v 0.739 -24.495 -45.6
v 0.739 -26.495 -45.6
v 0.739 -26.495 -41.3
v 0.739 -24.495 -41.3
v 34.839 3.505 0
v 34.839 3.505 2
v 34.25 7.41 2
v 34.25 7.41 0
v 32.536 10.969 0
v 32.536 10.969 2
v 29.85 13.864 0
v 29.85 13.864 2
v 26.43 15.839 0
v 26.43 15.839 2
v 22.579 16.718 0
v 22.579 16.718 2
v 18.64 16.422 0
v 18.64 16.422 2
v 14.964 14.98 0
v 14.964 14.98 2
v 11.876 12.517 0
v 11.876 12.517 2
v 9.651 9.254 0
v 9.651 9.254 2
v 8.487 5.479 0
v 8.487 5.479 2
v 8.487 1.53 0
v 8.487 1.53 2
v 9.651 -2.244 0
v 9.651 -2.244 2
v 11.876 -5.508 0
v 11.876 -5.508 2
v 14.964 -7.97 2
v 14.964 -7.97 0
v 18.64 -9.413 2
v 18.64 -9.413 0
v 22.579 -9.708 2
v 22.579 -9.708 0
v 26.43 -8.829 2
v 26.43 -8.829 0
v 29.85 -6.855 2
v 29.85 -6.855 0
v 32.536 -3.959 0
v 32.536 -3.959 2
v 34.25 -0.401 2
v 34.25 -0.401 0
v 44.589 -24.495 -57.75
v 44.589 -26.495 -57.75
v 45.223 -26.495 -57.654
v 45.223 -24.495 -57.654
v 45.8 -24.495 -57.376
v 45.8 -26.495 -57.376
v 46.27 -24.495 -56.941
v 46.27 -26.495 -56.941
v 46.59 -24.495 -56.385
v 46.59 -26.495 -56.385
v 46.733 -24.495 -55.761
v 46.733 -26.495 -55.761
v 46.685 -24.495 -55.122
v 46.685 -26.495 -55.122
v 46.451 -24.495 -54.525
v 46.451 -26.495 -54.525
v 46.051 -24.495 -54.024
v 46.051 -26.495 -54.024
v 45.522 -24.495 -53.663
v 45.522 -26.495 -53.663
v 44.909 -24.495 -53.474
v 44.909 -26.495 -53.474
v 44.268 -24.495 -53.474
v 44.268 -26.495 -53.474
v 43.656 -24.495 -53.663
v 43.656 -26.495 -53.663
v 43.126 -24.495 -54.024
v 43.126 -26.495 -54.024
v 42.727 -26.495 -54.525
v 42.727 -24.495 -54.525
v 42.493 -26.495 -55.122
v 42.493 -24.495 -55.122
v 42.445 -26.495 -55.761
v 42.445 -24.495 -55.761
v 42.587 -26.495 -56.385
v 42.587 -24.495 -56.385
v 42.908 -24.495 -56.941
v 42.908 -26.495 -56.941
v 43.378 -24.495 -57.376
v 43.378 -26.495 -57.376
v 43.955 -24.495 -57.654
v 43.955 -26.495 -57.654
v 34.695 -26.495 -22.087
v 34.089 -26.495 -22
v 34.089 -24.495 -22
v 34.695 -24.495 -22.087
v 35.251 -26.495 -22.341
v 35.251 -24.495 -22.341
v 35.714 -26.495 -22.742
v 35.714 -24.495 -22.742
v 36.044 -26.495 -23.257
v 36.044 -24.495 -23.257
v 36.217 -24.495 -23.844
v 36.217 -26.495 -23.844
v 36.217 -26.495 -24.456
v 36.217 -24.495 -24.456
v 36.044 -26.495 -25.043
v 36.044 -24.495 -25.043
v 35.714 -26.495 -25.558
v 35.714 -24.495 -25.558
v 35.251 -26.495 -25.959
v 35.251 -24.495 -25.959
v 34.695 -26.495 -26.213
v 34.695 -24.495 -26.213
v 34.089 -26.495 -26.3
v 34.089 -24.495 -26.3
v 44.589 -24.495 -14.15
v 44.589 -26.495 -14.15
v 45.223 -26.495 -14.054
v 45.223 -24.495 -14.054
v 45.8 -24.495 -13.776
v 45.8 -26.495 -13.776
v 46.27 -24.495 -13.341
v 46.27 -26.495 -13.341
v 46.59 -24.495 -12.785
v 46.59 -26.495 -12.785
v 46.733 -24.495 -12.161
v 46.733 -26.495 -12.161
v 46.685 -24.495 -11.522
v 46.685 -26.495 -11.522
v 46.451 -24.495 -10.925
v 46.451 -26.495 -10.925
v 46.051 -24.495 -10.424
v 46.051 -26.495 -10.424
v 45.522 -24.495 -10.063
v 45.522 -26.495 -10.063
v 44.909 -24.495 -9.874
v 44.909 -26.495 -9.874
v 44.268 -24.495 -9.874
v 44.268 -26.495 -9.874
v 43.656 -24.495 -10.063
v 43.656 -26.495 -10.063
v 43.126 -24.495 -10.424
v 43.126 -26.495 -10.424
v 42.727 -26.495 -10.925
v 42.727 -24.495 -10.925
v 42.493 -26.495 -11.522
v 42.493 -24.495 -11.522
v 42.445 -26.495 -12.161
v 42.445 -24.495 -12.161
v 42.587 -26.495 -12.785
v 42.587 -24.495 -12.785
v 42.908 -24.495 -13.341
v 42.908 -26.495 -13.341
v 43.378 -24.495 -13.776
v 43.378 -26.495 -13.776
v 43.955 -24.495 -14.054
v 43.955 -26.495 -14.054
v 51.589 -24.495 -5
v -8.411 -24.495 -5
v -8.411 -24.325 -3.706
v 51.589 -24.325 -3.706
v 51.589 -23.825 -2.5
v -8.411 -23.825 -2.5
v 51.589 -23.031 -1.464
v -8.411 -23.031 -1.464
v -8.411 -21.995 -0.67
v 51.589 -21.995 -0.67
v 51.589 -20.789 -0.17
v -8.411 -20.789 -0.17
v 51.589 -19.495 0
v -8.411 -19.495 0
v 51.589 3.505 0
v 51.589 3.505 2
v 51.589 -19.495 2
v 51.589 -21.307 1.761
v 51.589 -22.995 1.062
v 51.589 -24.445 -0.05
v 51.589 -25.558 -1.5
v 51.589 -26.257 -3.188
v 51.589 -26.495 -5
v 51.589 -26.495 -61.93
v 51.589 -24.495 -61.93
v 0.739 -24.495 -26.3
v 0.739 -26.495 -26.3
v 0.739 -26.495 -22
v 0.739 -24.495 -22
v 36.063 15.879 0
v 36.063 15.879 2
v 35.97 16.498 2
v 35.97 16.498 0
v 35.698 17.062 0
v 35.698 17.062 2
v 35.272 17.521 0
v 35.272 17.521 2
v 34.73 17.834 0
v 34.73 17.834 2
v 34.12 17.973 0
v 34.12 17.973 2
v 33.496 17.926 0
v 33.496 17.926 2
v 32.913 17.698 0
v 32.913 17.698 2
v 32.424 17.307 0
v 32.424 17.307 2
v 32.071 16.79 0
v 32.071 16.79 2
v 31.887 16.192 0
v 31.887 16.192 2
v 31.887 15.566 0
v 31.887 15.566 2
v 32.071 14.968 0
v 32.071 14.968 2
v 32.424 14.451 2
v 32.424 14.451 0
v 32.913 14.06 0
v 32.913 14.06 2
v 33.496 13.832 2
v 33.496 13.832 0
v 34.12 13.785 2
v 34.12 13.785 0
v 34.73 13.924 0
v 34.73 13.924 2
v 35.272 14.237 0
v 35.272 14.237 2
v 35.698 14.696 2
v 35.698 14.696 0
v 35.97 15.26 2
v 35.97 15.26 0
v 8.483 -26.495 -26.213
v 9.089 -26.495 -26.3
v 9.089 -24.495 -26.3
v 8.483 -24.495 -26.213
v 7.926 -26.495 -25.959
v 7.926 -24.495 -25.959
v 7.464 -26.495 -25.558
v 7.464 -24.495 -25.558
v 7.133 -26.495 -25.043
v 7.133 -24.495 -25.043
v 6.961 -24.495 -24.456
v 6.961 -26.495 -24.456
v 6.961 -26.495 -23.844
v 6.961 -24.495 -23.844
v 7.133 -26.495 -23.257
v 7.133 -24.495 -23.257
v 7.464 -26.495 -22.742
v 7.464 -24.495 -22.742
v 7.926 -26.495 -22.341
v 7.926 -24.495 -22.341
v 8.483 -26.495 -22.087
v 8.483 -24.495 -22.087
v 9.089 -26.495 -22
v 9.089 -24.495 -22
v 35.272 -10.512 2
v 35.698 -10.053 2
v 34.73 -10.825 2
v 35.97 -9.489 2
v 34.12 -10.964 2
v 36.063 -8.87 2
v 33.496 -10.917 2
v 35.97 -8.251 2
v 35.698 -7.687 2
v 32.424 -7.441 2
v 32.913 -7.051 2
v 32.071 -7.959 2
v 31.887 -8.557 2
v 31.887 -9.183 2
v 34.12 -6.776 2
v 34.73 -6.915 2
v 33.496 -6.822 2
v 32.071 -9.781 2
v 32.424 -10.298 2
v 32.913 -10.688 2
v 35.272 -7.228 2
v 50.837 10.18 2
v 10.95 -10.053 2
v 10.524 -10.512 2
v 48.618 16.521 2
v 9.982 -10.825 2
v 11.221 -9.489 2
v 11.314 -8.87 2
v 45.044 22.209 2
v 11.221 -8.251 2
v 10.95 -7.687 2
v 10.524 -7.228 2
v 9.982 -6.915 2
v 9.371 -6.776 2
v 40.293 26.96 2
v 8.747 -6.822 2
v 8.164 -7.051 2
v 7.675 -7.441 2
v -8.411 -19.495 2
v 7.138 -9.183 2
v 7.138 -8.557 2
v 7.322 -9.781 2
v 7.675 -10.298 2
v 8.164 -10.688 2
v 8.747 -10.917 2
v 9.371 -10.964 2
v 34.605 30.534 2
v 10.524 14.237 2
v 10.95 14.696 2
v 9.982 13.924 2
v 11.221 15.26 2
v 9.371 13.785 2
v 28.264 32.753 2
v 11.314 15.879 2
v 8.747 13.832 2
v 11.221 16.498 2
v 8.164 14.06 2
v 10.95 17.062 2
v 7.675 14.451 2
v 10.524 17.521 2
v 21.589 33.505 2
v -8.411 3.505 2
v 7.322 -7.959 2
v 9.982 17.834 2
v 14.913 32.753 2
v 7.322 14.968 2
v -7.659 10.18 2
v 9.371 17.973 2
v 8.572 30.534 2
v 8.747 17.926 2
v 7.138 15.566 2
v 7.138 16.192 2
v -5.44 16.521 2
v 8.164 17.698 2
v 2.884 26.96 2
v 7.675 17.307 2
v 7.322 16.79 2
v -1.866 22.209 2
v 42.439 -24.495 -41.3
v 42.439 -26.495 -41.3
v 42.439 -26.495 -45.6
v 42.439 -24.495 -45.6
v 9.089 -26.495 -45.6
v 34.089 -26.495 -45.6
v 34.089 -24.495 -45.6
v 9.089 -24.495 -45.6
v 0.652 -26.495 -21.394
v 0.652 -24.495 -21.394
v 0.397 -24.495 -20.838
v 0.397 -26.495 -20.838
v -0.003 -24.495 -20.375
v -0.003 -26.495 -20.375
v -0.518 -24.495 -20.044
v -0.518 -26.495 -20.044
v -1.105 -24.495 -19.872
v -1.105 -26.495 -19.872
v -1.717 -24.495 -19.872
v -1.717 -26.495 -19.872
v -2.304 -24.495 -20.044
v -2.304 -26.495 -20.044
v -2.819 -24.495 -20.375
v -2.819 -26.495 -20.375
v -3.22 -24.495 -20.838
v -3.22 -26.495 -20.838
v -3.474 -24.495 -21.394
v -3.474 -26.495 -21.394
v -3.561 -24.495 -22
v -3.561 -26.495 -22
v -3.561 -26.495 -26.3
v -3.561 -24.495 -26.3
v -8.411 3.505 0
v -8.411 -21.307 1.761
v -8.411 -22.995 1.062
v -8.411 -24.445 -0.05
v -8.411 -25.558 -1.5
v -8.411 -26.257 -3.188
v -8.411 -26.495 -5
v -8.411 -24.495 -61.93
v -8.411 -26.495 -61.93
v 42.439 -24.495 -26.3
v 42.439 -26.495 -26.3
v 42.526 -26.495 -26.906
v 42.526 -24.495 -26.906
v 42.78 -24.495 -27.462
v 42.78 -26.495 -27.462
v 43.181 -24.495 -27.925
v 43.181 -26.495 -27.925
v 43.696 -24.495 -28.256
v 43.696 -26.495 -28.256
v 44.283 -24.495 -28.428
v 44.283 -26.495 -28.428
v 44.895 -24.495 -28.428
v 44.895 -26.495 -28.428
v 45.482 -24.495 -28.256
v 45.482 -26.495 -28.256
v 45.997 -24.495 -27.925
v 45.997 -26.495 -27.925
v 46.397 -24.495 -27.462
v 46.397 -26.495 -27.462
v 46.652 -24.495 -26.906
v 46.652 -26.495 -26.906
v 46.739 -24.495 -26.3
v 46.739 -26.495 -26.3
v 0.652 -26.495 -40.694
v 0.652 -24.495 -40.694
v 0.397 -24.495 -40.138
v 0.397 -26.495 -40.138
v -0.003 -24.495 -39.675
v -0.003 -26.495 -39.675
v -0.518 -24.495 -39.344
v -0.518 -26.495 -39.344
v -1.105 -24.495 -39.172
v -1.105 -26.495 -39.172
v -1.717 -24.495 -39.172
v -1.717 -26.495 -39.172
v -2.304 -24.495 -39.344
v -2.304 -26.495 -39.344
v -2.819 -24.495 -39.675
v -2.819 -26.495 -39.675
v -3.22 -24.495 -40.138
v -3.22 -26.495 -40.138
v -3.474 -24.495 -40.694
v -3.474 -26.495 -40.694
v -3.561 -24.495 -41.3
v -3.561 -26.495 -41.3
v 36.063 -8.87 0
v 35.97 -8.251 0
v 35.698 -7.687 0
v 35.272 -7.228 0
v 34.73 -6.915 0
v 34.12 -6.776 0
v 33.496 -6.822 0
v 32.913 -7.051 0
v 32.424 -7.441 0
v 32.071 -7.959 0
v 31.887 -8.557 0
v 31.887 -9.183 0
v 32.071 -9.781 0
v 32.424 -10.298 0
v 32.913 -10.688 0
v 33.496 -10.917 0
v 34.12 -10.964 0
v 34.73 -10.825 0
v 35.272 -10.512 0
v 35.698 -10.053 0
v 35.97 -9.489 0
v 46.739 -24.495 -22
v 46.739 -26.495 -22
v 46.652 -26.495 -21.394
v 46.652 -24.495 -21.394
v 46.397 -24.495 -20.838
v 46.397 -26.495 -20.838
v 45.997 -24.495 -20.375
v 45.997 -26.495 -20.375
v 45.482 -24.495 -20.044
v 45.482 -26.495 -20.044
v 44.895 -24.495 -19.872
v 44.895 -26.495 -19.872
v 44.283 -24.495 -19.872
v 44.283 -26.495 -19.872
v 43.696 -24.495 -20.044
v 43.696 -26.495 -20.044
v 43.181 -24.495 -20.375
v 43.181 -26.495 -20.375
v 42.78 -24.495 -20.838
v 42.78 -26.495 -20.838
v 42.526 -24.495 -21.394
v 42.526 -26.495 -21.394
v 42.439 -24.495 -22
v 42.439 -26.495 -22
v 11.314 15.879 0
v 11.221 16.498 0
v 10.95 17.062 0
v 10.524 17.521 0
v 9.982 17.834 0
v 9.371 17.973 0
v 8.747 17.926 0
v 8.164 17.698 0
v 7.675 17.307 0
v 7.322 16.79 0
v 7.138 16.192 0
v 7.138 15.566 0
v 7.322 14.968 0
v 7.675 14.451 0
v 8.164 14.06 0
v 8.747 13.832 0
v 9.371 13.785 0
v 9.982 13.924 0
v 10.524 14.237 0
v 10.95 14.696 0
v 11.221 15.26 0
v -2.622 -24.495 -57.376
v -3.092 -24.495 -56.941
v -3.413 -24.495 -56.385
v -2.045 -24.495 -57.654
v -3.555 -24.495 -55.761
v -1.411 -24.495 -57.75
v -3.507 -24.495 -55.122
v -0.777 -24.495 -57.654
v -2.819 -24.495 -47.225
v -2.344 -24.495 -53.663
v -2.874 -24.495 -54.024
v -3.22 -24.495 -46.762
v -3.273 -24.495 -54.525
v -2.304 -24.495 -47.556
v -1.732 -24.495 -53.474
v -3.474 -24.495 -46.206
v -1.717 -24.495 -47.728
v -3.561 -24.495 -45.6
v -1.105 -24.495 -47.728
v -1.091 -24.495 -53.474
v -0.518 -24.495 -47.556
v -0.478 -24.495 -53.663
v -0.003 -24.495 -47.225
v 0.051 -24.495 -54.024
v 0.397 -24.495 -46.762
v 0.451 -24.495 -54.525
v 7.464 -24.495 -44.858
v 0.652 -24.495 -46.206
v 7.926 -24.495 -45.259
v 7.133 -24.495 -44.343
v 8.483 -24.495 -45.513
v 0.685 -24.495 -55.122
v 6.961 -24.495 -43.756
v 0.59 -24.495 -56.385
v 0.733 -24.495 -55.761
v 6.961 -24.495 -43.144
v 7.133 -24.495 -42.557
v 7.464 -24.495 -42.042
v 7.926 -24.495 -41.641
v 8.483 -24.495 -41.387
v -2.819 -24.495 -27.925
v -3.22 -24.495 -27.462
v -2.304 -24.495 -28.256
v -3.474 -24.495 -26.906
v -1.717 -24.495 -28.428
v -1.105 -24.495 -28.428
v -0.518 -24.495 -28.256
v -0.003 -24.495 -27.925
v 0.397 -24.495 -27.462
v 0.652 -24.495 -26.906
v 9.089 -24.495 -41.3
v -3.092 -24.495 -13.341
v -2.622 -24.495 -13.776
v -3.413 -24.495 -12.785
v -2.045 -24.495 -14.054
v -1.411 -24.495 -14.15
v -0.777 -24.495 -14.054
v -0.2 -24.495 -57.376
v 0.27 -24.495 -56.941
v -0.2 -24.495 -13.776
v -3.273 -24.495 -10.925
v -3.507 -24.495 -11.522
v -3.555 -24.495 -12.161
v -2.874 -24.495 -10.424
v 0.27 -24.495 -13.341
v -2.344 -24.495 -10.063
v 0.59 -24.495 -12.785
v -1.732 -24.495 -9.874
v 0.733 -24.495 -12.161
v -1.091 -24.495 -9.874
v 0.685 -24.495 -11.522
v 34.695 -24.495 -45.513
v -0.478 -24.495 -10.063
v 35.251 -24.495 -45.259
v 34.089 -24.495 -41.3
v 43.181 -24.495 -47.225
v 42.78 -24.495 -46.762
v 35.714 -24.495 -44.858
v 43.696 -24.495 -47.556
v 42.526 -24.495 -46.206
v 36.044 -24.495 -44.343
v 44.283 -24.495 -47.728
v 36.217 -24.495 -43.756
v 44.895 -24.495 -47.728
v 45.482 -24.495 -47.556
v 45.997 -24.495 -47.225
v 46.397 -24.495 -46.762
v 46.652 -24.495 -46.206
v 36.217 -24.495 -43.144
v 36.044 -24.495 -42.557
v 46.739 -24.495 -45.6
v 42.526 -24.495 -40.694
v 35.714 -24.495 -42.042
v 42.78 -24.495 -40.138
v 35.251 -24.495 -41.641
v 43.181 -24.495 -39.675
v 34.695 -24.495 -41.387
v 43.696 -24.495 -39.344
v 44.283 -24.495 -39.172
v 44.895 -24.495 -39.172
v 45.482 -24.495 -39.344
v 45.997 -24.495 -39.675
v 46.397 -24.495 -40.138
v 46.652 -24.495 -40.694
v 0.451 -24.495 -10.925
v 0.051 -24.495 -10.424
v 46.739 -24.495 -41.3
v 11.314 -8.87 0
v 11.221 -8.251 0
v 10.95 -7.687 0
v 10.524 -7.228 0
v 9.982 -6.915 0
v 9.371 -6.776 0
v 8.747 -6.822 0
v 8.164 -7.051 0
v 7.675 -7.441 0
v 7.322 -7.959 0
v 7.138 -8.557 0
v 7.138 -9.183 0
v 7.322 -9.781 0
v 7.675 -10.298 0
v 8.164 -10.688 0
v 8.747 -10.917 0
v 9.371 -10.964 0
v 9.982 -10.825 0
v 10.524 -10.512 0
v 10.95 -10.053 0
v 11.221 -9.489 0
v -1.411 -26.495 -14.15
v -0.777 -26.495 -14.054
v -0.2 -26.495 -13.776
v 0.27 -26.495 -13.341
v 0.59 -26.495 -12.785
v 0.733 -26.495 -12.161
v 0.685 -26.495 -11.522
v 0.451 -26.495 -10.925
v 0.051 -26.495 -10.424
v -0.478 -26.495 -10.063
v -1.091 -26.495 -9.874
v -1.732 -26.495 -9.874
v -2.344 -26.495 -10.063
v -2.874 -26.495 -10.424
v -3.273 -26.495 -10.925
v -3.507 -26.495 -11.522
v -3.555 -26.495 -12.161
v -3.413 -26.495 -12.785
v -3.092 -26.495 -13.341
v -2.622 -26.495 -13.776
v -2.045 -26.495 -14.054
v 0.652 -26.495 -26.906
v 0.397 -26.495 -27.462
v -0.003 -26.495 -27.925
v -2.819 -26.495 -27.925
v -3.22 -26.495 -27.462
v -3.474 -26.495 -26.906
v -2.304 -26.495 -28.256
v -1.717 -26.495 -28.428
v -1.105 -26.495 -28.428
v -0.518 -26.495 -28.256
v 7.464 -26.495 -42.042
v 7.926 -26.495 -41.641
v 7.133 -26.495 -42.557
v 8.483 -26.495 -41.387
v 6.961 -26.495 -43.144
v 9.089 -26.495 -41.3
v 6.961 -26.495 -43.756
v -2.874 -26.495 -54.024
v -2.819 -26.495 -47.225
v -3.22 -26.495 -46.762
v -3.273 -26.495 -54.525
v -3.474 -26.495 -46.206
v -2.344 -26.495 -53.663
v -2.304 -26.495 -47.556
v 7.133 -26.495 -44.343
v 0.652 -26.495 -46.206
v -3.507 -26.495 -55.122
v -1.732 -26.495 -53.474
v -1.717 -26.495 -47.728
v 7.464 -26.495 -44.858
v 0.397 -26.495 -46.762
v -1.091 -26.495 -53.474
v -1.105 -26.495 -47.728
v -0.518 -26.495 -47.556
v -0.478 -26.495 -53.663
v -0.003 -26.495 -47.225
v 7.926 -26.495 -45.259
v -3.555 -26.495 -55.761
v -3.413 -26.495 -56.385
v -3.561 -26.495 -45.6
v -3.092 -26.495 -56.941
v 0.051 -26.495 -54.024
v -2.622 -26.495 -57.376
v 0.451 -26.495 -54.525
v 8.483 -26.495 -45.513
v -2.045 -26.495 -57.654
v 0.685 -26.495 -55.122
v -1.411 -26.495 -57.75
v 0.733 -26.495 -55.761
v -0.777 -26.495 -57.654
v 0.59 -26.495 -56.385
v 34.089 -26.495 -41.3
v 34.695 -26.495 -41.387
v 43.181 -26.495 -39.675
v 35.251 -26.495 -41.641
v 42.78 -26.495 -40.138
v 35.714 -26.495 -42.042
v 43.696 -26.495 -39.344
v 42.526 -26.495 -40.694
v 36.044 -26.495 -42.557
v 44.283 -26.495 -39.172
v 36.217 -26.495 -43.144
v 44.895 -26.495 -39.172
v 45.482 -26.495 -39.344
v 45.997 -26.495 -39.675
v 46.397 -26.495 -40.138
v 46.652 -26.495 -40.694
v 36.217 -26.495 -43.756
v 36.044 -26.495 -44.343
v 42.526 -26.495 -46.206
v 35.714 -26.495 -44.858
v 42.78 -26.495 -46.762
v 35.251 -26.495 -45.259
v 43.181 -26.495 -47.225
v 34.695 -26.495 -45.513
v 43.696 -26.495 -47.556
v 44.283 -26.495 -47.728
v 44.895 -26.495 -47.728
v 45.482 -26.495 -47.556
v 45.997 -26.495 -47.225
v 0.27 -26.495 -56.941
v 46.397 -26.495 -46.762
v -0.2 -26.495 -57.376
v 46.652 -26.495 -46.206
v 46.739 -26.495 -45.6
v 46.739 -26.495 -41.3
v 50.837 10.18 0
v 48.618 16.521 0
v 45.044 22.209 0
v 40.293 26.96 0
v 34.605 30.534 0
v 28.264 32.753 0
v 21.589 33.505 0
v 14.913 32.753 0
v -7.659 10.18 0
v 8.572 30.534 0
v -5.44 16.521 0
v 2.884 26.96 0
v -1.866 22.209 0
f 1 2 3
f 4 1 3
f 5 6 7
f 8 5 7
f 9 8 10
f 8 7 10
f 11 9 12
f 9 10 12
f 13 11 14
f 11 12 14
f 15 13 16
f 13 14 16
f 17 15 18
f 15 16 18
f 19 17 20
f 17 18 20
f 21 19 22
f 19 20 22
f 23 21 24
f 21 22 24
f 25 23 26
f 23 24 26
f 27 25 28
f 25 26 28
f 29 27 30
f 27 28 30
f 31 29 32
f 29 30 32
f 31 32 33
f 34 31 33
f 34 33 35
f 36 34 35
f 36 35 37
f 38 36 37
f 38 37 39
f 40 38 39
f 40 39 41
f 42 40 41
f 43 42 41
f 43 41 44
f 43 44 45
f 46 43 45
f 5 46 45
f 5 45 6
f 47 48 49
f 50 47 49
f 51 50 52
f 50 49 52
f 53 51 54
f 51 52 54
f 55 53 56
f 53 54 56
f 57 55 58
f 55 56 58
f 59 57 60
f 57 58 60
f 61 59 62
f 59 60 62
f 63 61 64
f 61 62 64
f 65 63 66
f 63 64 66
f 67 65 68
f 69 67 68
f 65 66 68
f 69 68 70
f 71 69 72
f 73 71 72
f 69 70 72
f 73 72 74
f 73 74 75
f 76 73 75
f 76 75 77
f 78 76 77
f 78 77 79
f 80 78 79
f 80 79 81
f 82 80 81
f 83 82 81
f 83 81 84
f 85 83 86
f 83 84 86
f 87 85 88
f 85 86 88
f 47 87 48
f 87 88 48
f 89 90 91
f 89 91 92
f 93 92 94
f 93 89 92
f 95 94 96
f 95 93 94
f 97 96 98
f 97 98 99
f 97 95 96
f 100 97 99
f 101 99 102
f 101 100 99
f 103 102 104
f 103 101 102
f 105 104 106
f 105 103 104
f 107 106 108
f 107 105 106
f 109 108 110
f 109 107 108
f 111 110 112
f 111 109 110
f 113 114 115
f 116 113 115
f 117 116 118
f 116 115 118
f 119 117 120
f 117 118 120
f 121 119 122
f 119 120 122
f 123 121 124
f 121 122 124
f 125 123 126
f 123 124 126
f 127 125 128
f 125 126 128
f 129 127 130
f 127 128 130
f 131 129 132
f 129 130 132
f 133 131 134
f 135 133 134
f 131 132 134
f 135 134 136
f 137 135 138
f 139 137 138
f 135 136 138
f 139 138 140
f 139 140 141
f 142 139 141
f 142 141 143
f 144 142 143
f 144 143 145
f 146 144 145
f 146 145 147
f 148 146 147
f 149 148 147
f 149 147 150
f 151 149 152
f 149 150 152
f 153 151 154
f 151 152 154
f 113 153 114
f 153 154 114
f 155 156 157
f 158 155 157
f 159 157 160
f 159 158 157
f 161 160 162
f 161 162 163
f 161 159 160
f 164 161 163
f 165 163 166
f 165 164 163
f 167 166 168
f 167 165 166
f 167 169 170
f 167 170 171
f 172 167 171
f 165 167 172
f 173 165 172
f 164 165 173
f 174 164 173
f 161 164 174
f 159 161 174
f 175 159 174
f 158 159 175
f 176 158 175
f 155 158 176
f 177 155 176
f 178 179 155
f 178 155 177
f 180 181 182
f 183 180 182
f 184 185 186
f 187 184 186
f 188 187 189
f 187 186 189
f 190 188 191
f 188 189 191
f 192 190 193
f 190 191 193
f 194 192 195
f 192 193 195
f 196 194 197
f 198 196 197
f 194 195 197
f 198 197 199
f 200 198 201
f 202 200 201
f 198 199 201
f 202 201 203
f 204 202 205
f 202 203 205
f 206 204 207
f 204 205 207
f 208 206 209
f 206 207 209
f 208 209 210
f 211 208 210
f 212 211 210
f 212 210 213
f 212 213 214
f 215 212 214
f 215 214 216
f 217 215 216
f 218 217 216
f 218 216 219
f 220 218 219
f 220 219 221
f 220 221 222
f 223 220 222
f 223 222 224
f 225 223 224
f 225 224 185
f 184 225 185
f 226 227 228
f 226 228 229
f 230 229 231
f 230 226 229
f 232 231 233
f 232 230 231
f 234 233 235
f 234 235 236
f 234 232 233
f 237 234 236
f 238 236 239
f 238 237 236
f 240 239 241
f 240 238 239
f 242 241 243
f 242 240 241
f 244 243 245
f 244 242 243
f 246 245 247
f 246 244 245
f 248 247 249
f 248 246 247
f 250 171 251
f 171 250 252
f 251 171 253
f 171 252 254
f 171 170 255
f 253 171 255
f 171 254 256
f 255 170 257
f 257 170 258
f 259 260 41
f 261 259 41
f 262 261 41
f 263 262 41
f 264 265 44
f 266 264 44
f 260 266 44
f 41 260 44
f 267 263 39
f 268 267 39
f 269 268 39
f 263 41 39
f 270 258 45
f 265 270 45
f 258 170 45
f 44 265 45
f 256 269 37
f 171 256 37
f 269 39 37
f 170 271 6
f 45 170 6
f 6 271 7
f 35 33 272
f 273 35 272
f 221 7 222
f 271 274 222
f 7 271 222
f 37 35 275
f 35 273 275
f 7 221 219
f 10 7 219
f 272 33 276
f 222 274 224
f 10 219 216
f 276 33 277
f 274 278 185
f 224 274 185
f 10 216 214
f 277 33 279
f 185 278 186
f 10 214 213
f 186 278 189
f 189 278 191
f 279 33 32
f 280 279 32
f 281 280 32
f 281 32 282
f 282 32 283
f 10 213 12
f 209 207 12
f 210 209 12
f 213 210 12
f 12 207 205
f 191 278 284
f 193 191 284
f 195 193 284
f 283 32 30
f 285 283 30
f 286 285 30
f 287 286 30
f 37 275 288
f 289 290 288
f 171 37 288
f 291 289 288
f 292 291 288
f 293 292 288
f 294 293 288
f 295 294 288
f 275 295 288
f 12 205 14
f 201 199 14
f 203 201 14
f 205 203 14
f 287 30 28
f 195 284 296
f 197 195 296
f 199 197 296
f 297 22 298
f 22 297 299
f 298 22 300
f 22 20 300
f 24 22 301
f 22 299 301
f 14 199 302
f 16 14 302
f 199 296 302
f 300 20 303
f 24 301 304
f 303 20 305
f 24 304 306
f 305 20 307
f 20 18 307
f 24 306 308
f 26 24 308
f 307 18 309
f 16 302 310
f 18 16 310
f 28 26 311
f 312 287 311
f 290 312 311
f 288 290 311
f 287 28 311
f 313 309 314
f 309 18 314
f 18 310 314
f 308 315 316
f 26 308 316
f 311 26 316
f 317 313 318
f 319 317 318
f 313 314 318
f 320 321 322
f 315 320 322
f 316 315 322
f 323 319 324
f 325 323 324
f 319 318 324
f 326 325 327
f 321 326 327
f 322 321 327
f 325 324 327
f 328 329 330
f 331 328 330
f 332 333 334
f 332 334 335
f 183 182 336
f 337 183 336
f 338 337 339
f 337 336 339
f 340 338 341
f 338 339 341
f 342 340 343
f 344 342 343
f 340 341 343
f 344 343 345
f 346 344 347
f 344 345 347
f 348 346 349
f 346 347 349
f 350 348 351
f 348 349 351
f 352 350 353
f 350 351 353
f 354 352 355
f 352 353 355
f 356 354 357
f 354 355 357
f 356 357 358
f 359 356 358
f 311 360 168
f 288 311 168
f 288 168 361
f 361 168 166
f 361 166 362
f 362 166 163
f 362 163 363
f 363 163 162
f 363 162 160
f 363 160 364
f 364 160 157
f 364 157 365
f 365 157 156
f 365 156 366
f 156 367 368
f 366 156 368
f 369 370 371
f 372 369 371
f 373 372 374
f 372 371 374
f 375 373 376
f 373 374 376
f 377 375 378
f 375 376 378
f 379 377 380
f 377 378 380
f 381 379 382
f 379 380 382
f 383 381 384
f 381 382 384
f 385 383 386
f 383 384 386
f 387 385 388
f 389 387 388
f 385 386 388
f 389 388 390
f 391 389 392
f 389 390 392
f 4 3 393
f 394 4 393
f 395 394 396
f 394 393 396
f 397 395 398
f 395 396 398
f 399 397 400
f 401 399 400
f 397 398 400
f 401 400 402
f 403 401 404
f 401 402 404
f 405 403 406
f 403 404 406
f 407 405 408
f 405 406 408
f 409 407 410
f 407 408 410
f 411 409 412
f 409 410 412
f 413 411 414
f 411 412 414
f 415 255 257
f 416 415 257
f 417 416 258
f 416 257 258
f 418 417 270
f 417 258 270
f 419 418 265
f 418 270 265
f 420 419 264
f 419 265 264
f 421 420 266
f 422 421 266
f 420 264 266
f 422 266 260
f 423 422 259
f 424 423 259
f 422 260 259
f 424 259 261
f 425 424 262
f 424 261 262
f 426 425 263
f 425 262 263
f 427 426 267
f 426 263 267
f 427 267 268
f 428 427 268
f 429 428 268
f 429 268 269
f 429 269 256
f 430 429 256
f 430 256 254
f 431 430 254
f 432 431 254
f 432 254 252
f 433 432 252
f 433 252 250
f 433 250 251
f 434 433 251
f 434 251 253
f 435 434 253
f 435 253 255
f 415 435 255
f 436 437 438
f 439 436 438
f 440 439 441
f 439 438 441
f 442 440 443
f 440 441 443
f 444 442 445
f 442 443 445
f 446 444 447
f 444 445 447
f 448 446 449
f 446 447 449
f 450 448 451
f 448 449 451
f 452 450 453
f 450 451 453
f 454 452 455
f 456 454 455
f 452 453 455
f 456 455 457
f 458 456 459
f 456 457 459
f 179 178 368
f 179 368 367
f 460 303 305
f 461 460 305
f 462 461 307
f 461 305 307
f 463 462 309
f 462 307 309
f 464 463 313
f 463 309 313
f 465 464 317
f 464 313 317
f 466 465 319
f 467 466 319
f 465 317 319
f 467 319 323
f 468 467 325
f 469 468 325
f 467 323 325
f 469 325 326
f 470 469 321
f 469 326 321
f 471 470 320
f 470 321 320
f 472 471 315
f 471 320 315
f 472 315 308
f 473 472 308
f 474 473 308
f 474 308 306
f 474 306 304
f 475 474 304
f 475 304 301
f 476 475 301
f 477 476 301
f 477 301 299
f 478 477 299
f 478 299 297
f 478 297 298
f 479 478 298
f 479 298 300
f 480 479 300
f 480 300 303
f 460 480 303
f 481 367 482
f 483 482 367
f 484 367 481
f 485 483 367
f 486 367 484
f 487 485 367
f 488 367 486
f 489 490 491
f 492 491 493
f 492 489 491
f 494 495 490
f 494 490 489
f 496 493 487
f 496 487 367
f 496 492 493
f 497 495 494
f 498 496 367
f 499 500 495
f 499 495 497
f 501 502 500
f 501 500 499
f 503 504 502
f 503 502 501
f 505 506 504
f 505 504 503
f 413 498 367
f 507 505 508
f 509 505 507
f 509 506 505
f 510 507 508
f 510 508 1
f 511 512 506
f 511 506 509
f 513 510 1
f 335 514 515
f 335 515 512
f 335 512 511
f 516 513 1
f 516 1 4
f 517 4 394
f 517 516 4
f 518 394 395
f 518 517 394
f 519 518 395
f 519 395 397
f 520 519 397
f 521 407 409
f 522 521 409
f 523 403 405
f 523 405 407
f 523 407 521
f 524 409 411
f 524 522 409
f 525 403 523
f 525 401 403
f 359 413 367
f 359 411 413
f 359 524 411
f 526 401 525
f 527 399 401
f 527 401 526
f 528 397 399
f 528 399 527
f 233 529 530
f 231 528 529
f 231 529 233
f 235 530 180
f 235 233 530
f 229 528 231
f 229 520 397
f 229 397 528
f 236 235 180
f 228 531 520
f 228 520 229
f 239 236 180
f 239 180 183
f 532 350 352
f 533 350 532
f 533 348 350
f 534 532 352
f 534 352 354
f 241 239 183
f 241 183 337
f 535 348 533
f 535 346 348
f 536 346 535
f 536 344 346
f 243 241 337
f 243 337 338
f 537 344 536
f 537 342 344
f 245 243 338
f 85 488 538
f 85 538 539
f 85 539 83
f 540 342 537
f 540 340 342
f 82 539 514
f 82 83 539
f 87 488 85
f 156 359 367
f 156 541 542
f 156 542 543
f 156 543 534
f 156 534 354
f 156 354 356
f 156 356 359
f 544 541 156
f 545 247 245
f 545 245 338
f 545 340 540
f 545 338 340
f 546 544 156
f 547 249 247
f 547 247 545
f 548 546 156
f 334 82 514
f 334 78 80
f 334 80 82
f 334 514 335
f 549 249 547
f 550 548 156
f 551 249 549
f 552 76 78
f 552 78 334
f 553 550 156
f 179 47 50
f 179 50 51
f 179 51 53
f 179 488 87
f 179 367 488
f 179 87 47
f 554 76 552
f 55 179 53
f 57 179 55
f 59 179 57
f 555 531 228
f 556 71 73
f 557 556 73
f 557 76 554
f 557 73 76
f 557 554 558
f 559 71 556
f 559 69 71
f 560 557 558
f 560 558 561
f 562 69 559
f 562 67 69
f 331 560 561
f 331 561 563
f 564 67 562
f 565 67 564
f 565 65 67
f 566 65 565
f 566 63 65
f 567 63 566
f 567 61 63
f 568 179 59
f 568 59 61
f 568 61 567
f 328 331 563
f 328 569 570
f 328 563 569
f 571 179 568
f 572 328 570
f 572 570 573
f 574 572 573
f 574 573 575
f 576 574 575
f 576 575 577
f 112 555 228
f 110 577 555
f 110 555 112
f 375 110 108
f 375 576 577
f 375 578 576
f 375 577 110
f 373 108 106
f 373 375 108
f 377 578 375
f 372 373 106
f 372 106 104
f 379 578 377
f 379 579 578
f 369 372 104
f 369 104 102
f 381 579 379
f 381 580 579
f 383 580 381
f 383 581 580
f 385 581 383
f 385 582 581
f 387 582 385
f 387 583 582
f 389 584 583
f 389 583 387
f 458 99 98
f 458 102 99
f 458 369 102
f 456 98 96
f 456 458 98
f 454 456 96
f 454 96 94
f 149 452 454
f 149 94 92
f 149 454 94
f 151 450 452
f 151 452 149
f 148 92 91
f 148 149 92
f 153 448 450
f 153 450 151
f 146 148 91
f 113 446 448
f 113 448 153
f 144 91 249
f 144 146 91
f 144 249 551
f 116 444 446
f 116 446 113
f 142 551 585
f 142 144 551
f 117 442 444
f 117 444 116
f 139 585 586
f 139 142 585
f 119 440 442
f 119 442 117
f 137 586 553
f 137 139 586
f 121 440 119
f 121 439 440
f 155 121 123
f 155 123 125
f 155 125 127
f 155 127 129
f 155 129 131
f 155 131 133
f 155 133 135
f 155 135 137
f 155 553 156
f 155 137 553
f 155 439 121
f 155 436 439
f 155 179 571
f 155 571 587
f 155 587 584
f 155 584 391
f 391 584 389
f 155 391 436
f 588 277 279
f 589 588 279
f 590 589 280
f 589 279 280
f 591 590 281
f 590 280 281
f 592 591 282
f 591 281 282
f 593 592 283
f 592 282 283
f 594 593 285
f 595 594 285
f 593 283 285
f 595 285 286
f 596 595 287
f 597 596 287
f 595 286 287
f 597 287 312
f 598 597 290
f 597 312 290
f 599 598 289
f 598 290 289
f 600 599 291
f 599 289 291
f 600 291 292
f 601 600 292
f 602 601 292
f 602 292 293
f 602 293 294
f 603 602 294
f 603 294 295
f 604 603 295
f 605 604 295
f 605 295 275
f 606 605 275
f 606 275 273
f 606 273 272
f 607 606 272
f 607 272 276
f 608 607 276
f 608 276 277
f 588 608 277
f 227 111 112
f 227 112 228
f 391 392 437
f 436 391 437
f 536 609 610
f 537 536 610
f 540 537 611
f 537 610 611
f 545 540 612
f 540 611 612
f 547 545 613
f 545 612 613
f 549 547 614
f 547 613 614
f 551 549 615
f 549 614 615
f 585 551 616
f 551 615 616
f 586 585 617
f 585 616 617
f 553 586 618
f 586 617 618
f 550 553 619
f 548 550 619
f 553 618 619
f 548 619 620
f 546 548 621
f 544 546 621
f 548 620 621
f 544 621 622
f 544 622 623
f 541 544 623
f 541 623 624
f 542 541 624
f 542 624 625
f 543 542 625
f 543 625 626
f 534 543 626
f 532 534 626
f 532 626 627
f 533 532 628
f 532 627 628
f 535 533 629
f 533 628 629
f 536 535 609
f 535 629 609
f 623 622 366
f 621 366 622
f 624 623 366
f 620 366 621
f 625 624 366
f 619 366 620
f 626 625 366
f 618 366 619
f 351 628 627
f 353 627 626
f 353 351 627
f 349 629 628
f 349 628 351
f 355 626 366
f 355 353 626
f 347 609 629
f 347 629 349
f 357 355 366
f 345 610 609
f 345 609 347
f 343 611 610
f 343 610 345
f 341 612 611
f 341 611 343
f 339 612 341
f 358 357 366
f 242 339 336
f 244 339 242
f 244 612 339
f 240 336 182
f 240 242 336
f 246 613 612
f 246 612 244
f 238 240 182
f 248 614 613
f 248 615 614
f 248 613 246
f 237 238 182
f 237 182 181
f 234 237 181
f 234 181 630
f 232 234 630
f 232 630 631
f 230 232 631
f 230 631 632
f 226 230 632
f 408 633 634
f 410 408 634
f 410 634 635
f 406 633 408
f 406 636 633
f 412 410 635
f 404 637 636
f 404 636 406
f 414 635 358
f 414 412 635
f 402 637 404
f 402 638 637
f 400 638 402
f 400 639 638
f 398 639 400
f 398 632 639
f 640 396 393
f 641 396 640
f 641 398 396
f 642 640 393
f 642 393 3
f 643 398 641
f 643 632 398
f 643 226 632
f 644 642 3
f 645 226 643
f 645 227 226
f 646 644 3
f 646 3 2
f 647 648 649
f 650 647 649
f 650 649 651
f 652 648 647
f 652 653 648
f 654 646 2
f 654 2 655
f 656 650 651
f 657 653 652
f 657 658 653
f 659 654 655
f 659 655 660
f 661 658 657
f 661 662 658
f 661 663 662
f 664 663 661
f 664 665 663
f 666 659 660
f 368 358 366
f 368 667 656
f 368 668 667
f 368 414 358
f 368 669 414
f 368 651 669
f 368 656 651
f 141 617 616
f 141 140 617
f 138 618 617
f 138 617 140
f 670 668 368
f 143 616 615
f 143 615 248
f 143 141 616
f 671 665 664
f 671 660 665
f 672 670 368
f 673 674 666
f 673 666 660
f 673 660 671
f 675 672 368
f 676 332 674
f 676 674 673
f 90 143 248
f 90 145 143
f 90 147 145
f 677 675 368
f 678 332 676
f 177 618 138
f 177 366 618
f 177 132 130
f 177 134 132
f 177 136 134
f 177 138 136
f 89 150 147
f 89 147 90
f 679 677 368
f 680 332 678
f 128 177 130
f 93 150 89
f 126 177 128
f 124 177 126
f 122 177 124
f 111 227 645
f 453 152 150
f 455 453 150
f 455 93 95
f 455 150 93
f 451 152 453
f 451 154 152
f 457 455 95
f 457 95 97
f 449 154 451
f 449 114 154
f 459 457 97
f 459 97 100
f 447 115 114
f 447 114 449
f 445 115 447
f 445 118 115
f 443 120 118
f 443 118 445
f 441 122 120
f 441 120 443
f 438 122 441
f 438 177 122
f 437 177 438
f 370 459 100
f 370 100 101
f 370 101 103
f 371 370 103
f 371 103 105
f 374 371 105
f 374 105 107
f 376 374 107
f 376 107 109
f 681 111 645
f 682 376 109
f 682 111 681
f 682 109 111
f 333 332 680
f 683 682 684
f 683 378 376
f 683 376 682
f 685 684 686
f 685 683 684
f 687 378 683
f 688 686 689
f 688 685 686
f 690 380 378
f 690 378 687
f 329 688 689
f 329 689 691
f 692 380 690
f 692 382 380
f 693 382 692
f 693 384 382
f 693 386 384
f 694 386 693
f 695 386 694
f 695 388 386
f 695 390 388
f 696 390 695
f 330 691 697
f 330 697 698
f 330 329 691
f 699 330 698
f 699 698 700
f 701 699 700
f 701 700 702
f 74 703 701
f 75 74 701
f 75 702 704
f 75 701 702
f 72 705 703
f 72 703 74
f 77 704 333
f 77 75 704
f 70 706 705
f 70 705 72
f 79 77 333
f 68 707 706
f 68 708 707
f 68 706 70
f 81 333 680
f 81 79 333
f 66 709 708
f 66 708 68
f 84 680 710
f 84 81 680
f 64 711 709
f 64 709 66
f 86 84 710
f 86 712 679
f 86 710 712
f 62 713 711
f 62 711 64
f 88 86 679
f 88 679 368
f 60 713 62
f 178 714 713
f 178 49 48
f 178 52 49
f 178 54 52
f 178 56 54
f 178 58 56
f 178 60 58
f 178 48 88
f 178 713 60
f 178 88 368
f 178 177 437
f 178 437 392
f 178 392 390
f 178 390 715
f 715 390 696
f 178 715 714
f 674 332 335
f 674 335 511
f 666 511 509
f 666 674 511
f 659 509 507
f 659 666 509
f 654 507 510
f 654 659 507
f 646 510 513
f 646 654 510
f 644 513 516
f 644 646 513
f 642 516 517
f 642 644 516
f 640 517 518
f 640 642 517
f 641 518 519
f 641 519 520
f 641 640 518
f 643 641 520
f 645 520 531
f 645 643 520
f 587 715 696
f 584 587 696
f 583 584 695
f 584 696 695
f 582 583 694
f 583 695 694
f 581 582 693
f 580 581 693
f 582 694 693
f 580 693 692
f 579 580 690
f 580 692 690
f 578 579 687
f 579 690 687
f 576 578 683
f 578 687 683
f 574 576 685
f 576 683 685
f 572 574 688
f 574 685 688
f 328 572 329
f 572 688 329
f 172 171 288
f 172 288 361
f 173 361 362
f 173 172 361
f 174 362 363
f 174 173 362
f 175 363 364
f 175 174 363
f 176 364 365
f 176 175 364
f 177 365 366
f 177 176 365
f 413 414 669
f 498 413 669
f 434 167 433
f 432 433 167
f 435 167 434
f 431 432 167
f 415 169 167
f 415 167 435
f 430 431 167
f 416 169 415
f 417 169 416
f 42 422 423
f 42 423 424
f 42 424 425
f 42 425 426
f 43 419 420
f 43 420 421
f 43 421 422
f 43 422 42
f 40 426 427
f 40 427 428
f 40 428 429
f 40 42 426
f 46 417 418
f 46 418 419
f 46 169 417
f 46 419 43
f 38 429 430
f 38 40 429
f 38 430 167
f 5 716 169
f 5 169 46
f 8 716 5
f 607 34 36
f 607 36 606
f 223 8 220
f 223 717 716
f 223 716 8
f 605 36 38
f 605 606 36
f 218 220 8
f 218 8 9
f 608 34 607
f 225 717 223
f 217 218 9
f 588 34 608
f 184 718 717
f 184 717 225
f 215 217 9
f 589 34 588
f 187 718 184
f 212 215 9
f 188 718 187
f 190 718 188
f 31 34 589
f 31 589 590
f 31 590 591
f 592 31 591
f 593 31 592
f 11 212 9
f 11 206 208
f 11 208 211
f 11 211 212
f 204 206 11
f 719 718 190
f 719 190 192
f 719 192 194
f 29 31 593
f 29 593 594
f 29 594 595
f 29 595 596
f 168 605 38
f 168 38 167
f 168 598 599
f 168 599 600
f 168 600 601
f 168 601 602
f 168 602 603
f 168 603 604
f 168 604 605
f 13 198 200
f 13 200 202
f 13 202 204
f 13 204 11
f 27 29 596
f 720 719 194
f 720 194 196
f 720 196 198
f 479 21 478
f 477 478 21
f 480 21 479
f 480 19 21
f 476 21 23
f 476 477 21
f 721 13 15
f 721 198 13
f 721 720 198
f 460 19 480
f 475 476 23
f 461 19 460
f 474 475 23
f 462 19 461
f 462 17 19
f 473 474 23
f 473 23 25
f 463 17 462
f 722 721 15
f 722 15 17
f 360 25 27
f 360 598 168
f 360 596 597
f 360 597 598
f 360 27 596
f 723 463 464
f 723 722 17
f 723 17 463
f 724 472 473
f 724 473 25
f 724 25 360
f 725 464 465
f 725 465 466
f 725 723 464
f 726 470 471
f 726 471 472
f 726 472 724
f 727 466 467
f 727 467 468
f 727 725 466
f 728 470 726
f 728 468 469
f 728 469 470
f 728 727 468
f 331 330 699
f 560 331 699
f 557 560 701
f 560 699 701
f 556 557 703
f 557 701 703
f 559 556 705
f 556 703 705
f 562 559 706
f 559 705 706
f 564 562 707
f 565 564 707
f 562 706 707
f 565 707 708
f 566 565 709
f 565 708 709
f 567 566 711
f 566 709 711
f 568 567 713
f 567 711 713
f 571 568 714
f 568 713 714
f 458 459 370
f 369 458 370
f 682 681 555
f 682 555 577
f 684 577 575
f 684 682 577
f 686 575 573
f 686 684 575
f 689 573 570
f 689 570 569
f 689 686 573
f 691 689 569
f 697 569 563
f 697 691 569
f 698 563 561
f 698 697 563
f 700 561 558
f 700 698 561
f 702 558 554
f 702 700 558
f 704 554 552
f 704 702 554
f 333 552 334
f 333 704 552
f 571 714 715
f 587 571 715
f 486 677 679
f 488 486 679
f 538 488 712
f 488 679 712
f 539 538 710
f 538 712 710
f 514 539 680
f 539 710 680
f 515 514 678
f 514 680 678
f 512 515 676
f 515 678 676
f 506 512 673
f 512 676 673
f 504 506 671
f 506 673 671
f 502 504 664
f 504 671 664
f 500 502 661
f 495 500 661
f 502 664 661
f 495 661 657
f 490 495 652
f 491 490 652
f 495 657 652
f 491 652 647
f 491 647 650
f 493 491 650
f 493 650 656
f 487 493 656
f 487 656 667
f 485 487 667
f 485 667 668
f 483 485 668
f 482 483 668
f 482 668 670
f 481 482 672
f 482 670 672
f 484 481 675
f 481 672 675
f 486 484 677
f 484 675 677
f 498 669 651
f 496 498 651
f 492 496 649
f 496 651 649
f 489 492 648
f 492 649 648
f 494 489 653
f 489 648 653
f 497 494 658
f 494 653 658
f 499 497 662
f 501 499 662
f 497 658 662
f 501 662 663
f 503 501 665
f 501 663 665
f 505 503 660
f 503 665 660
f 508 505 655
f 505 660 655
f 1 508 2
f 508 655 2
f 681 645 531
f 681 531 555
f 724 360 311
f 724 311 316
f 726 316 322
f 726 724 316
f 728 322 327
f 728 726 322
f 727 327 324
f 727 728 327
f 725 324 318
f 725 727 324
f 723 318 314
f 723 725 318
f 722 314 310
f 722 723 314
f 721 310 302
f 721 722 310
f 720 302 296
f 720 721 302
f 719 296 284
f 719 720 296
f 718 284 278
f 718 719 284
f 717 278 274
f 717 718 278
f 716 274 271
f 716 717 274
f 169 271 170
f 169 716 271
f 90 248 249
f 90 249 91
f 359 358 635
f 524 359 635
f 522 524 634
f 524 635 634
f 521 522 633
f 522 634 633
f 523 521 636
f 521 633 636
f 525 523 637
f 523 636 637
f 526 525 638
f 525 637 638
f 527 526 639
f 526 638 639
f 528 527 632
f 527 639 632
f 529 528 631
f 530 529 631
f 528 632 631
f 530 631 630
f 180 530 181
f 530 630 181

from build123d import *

# Parameters (mm, degrees)
BOSS_EXTRUDE2_DEPTH          = 2
SKETCH2_R                    = 13.25
CUT_EXTRUDE1_DEPTH           = 62.54645277
EDGE_FLANGE1_STRIP_W         = 18
EDGE_FLANGE1_STRIP_H         = 2
EDGE_FLANGE1_STRIP_CUT_DEPTH = 60
EDGE_FLANGE1_DEPTH           = 60
SKETCH12_R                   = 2.1
CUT_EXTRUDE2_DEPTH           = 89.718717014
SKETCH13_R                   = 2.15
CUT_EXTRUDE3_DEPTH           = 2


# Sheet-metal steps are written as plain solids
with BuildPart() as part:
    # Sketch1 → Boss-Extrude2 (new body)
    with BuildSketch(Plane.XY):
        with BuildLine():
            Line((51.588785047, -26.495327103), (-8.411214953, -26.495327103))
            Line((-8.411214953, -26.495327103), (-8.411214953, 3.504672897))
            ThreePointArc((-8.411214953, 3.504672897), (21.588785047, 33.504672897), (51.588785047, 3.504672897))
            Line((51.588785047, 3.504672897), (51.588785047, -26.495327103))
        make_face()
    extrude(amount=BOSS_EXTRUDE2_DEPTH)

    # Sketch2 → Cut-Extrude1 (cut, through all)
    with BuildSketch(Plane.XY.offset(2)):
        with Locations((21.588785047, 3.504672897)):
            Circle(SKETCH2_R)
    extrude(amount=-CUT_EXTRUDE1_DEPTH, mode=Mode.SUBTRACT)

    # Edge-Flange1 strip (across the edge) → Edge-Flange1 strip cut (cut)
    with BuildSketch(Plane(origin=(51.588785047, -26.495327103, 0), x_dir=(0, 1, 0), z_dir=(-1, 0, 0))):
        with Locations((-2, -1)):
            Rectangle(EDGE_FLANGE1_STRIP_W, EDGE_FLANGE1_STRIP_H)
    extrude(amount=EDGE_FLANGE1_STRIP_CUT_DEPTH, mode=Mode.SUBTRACT)

    # Edge-Flange1 section (across the edge) → Edge-Flange1 (add)
    with BuildSketch(Plane(origin=(51.588785047, -26.495327103, 0), x_dir=(0, 1, 0), z_dir=(-1, 0, 0))):
        with BuildLine():
            Line((0, 5), (0, 61.93))
            Line((0, 61.93), (2, 61.93))
            Line((2, 61.93), (2, 5))
            ThreePointArc((2, 5), (3.464466094, 1.464466094), (7, 0))
            Line((7, 0), (7, -2))
            ThreePointArc((7, -2), (2.050252532, 0.050252532), (0, 5))
        make_face()
    extrude(amount=EDGE_FLANGE1_DEPTH)

    # Sketch12 → Cut-Extrude2 (cut, through all)
    with BuildSketch(Plane.XY.offset(2)):
        with Locations((33.963153717, 15.879041568)):
            Circle(SKETCH12_R)
        with Locations((33.963153717, -8.869695774)):
            Circle(SKETCH12_R)
        with Locations((9.214416376, -8.869695774)):
            Circle(SKETCH12_R)
        with Locations((9.214416376, 15.879041568)):
            Circle(SKETCH12_R)
    extrude(amount=-CUT_EXTRUDE2_DEPTH, mode=Mode.SUBTRACT)

    # Sketch13 → Cut-Extrude3 (cut)
    with BuildSketch(Plane.XZ.offset(26.495327103)):
        with Locations(Location((-1.411214953, -12, 0), (0, 0, 270))):
            Circle(SKETCH13_R)
        with Locations(Location((44.588785047, -12, 0), (0, 0, 270))):
            Circle(SKETCH13_R)
        with Locations(Location((44.588785047, -55.6, 0), (0, 0, 270))):
            Circle(SKETCH13_R)
        with Locations(Location((-1.411214953, -55.6, 0), (0, 0, 270))):
            Circle(SKETCH13_R)
        with BuildLine():
            Line((-3.561214953, -41.3), (-3.561214953, -45.6))
            ThreePointArc((-3.561214953, -45.6), (-1.411214953, -47.75), (0.738785047, -45.6))
            Line((0.738785047, -45.6), (0.738785047, -41.3))
            ThreePointArc((0.738785047, -41.3), (-1.411214953, -39.15), (-3.561214953, -41.3))
        make_face()
        with BuildLine():
            Line((-3.561214953, -22), (-3.561214953, -26.3))
            ThreePointArc((-3.561214953, -26.3), (-1.411214953, -28.45), (0.738785047, -26.3))
            Line((0.738785047, -26.3), (0.738785047, -22))
            ThreePointArc((0.738785047, -22), (-1.411214953, -19.85), (-3.561214953, -22))
        make_face()
        with BuildLine():
            Line((46.738785047, -26.3), (46.738785047, -22))
            ThreePointArc((46.738785047, -22), (44.588785047, -19.85), (42.438785047, -22))
            Line((42.438785047, -22), (42.438785047, -26.3))
            ThreePointArc((42.438785047, -26.3), (44.588785047, -28.45), (46.738785047, -26.3))
        make_face()
        with BuildLine():
            Line((42.438785047, -41.3), (42.438785047, -45.6))
            ThreePointArc((42.438785047, -45.6), (44.588785047, -47.75), (46.738785047, -45.6))
            Line((46.738785047, -45.6), (46.738785047, -41.3))
            ThreePointArc((46.738785047, -41.3), (44.588785047, -39.15), (42.438785047, -41.3))
        make_face()
        with BuildLine():
            Line((9.088785047, -22), (34.088785047, -22))
            ThreePointArc((34.088785047, -22), (36.238785047, -24.15), (34.088785047, -26.3))
            Line((34.088785047, -26.3), (9.088785047, -26.3))
            ThreePointArc((9.088785047, -26.3), (6.938785047, -24.15), (9.088785047, -22))
        make_face()
        with BuildLine():
            Line((9.088785047, -41.3), (34.088785047, -41.3))
            ThreePointArc((34.088785047, -41.3), (36.238785047, -43.45), (34.088785047, -45.6))
            Line((34.088785047, -45.6), (9.088785047, -45.6))
            ThreePointArc((9.088785047, -45.6), (6.938785047, -43.45), (9.088785047, -41.3))
        make_face()
    extrude(amount=-CUT_EXTRUDE3_DEPTH, mode=Mode.SUBTRACT)


solid = part.part
